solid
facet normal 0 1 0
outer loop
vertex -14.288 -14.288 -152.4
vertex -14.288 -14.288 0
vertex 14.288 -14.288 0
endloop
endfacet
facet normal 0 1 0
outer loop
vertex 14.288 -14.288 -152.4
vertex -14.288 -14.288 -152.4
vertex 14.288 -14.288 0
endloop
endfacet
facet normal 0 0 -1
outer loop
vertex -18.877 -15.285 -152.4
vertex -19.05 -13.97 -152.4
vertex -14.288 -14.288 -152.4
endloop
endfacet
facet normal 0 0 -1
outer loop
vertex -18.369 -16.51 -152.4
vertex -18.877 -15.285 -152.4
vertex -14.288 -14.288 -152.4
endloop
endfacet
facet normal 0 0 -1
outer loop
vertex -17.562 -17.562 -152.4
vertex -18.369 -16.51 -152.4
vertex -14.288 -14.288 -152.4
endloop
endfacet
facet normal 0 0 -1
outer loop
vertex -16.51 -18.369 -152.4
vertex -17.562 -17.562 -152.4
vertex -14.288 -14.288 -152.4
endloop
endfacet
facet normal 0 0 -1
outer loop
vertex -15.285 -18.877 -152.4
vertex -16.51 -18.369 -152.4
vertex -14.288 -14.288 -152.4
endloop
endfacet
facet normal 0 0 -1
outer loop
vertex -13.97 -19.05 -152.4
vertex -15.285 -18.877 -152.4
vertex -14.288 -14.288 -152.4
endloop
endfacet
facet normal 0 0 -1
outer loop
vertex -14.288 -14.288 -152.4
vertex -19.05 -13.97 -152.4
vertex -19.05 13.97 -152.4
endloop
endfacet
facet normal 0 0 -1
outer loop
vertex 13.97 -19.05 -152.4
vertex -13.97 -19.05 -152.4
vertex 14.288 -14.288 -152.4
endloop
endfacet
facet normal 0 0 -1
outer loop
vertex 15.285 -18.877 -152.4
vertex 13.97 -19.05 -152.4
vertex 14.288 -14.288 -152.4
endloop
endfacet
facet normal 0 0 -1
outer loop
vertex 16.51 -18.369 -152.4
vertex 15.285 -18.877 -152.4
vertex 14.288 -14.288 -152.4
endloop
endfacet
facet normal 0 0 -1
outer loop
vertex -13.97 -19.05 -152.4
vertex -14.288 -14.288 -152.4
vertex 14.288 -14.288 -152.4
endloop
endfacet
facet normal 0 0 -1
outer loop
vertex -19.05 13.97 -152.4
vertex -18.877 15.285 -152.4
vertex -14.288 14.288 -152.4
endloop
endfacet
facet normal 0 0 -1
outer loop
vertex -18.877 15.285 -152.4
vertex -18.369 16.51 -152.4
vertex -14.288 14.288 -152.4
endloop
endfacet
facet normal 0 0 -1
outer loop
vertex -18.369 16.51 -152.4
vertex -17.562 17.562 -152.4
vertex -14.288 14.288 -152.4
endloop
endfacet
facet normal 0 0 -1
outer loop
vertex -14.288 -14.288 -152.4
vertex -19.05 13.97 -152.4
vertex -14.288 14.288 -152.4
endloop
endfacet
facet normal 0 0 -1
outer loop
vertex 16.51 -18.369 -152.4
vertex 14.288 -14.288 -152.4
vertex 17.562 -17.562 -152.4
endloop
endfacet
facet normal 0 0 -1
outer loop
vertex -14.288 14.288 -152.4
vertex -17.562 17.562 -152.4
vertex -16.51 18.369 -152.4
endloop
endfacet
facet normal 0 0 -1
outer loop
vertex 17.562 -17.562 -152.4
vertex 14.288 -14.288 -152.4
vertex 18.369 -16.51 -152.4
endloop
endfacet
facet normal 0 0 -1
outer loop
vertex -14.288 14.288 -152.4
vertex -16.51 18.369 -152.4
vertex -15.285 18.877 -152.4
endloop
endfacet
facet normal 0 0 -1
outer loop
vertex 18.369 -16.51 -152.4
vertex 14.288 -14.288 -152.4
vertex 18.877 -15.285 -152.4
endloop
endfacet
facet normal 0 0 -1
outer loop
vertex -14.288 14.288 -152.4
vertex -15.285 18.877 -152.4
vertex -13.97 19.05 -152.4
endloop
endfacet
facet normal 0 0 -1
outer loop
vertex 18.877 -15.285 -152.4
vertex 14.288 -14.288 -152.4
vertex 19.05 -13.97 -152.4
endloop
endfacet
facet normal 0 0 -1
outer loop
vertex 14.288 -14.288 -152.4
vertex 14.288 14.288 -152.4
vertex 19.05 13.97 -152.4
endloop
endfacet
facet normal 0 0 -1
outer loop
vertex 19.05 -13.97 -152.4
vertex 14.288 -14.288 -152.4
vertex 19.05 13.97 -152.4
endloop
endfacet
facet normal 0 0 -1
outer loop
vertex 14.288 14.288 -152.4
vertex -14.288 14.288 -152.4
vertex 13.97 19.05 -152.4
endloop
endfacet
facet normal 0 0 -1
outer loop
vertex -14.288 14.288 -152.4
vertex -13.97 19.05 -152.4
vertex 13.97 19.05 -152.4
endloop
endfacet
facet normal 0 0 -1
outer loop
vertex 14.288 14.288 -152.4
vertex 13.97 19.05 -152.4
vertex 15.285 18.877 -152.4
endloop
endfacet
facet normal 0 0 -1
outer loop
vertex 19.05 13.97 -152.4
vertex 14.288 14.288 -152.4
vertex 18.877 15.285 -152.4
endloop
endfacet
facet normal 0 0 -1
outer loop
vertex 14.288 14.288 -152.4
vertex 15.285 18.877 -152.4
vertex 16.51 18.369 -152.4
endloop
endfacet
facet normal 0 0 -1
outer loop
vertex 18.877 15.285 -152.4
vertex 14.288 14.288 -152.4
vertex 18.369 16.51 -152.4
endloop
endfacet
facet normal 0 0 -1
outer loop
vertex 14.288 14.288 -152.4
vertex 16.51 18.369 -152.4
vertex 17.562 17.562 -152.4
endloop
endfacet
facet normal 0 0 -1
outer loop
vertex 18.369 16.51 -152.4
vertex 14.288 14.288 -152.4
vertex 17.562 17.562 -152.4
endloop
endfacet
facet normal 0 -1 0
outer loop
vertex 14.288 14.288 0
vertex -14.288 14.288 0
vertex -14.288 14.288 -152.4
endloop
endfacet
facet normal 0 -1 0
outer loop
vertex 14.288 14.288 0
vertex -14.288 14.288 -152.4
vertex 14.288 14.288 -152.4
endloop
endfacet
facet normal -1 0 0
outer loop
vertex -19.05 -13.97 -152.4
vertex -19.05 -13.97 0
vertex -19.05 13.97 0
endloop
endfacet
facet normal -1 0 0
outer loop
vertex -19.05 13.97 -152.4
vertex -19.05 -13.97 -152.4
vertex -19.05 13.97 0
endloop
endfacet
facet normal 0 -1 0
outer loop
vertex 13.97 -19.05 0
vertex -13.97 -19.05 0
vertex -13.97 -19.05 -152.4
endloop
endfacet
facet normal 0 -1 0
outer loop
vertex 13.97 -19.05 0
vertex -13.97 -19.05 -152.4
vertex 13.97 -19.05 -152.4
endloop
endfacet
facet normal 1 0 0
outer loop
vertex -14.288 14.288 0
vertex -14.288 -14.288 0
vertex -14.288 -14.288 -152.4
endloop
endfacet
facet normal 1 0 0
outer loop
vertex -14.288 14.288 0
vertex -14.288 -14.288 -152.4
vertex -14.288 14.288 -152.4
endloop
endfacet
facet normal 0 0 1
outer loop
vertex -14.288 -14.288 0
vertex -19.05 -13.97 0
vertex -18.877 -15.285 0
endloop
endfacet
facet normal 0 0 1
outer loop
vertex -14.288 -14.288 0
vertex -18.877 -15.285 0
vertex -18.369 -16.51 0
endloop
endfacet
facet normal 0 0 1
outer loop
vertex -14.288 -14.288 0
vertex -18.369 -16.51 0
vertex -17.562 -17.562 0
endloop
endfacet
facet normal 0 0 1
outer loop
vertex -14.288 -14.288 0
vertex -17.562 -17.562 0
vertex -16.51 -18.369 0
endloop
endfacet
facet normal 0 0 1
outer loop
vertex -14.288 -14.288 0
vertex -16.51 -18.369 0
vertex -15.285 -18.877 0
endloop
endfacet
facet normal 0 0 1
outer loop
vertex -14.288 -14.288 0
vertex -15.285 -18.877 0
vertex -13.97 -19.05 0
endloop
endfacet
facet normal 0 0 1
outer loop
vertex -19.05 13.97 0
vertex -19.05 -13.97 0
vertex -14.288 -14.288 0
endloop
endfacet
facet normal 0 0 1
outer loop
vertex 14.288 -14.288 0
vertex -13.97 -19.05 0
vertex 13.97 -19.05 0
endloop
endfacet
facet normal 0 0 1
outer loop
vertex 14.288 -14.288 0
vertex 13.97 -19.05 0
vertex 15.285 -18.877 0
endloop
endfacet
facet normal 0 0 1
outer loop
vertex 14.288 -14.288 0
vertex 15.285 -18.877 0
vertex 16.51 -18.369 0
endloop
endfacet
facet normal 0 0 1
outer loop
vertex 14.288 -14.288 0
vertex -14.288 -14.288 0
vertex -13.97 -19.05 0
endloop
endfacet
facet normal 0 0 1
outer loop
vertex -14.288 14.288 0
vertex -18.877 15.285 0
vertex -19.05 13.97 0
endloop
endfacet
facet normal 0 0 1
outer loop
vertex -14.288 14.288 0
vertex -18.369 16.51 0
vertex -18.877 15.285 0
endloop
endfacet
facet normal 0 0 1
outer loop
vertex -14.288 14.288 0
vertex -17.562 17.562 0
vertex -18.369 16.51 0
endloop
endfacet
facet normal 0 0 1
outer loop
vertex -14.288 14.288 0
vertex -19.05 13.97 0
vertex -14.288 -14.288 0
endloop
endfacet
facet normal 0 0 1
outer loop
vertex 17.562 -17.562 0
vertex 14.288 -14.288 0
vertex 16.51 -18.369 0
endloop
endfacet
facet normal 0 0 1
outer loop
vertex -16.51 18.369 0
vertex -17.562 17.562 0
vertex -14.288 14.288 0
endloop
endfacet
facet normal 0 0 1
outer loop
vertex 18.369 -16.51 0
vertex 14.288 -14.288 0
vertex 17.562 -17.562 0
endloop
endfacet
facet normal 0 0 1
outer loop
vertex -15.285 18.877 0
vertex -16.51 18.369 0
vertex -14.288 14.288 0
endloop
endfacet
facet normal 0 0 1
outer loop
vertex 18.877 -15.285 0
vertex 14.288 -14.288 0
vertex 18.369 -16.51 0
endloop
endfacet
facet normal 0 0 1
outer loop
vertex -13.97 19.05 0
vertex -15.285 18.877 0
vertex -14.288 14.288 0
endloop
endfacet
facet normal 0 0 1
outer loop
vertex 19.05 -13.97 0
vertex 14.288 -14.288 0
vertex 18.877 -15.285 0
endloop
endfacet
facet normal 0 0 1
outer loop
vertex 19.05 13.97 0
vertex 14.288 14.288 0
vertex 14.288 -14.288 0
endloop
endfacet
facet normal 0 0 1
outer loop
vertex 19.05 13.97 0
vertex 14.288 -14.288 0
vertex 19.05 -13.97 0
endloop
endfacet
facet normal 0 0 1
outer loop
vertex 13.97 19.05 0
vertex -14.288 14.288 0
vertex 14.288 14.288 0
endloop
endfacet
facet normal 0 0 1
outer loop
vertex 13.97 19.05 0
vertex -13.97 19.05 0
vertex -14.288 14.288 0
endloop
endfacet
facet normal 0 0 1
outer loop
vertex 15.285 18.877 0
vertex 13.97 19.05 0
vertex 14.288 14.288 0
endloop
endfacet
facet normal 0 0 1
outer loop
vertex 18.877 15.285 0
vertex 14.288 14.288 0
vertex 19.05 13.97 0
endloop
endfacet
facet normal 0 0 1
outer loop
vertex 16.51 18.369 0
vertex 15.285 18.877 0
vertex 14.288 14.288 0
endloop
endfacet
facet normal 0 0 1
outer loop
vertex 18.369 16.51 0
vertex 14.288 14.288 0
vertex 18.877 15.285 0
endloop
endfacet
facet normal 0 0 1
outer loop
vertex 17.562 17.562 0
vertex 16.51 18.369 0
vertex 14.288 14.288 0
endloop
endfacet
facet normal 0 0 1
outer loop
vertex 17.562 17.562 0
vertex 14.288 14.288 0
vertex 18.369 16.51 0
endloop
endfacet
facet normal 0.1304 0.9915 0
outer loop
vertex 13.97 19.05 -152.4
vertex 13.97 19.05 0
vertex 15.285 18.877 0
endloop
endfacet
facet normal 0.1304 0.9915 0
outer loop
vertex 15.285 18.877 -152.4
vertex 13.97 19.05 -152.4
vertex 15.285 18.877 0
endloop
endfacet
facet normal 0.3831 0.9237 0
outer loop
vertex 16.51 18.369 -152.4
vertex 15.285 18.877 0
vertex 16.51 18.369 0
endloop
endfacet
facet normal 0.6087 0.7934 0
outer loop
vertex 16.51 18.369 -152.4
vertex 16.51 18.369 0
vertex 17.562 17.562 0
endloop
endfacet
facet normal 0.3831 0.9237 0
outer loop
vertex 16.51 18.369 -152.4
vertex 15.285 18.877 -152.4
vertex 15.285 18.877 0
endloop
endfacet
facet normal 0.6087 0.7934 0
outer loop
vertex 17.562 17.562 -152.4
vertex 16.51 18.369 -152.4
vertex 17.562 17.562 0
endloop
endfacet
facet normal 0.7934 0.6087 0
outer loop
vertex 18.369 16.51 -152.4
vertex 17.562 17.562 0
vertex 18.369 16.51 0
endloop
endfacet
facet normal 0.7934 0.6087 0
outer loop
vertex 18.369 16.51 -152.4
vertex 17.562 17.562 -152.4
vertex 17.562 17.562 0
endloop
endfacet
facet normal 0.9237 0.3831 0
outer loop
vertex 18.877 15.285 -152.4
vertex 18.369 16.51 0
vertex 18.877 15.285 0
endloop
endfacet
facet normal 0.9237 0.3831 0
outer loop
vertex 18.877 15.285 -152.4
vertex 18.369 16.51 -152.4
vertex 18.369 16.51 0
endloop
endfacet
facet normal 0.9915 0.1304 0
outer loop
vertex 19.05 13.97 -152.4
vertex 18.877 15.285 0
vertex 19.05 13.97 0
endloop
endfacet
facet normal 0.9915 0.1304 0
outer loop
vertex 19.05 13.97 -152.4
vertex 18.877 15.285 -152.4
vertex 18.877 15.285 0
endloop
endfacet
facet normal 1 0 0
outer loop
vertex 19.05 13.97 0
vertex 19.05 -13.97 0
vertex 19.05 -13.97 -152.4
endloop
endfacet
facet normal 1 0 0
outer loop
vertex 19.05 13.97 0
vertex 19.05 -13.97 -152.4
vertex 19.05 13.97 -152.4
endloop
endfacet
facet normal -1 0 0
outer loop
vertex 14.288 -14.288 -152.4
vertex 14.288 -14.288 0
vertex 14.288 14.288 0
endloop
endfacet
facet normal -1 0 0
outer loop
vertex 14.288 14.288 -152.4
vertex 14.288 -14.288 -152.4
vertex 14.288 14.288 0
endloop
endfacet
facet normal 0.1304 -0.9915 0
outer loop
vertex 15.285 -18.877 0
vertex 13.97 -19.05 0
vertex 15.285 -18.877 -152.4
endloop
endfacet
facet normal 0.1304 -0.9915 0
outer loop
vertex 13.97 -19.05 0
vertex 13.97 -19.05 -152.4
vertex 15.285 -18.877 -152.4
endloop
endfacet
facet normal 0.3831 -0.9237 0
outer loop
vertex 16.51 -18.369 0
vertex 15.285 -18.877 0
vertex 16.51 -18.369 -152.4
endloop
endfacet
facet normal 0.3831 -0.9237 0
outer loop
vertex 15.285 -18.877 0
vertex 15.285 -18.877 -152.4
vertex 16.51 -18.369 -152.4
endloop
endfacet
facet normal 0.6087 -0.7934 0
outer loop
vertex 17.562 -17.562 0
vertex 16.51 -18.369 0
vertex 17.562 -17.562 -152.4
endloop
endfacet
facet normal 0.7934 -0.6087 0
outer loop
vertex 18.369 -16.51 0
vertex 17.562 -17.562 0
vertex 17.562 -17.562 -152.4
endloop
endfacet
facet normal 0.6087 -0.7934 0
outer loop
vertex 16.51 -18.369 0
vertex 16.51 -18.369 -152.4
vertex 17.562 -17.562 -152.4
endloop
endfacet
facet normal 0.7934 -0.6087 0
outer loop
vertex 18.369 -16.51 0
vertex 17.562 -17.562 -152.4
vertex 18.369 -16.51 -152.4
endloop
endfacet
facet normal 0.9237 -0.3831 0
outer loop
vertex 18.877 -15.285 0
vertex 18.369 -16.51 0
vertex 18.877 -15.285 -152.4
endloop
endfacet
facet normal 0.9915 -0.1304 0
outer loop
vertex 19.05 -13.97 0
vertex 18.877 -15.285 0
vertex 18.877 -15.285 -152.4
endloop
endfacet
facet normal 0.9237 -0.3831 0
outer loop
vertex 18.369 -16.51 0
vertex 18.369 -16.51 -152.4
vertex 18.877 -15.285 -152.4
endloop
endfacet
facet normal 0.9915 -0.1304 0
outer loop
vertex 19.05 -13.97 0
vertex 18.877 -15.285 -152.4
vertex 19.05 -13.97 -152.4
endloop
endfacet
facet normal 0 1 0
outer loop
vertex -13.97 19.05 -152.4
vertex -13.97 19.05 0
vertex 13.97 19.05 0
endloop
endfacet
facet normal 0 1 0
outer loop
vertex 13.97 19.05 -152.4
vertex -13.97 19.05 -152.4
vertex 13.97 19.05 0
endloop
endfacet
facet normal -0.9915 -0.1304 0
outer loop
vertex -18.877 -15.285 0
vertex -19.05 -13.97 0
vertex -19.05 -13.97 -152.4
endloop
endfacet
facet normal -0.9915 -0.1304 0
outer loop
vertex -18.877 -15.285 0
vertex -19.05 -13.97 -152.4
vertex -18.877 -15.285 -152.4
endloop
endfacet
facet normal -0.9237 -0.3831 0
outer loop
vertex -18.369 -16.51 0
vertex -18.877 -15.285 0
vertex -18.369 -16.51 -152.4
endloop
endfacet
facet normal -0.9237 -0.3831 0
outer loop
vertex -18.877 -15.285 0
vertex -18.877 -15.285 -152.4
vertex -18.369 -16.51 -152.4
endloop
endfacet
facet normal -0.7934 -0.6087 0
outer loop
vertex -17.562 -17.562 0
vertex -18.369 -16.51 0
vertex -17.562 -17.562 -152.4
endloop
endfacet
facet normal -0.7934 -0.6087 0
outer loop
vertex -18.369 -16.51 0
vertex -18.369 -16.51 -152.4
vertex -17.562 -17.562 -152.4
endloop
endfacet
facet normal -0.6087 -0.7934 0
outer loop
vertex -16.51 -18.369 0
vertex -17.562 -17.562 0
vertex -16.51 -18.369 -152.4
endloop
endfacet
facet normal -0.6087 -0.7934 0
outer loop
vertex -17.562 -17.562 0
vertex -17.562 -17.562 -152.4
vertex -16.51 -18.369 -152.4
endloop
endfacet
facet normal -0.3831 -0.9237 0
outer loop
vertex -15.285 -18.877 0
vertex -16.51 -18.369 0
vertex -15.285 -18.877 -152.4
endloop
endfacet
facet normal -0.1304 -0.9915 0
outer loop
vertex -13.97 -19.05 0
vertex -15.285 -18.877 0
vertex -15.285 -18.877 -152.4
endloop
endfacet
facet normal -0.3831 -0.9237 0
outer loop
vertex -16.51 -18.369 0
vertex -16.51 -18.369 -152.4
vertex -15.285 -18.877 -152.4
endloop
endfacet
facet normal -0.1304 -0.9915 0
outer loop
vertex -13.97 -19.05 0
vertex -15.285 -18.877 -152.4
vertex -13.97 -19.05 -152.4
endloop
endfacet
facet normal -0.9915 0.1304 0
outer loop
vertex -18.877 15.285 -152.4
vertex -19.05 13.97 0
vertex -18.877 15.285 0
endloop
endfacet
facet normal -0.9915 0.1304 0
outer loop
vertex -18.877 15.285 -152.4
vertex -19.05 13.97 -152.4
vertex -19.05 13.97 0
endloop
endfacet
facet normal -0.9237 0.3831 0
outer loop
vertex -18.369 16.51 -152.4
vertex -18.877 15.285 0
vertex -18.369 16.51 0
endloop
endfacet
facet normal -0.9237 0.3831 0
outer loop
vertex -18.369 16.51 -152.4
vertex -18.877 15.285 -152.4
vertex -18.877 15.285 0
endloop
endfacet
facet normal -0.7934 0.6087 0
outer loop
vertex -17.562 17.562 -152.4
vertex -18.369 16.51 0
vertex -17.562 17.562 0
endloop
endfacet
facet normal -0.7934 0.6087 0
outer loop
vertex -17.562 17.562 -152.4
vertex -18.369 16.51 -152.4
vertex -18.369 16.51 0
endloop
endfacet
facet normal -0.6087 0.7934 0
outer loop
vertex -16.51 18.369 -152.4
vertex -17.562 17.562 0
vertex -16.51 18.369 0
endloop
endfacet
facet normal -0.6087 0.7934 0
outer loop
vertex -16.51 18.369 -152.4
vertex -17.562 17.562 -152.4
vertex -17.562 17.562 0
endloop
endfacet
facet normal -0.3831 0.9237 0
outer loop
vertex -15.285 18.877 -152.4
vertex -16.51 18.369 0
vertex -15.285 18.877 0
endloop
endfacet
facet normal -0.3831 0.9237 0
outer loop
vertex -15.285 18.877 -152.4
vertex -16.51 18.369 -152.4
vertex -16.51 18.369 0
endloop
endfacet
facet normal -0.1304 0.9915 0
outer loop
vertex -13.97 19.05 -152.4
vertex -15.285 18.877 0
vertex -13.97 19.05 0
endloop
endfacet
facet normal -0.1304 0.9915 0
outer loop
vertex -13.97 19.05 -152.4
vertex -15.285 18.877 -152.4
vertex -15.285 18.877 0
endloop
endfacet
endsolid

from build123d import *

# Parameters (mm, degrees)
F0_W     = 38.1
F0_H     = 38.1
F0_W_2   = 28.575
F0_H_2   = 28.575
F1_DEPTH = 152.4
F2_R     = 5.08


with BuildPart() as f1:
    # F0 (on Top) → F1 (new body)
    with BuildSketch(Plane.XY):
        Rectangle(F0_W, F0_H)
        Rectangle(F0_W_2, F0_H_2, mode=Mode.SUBTRACT)
    extrude(amount=-F1_DEPTH)

    # F2
    f2_edges = [f1.edges().sort_by_distance(p)[0] for p in [
        (19.05, -19.05, -76.2),
        (19.05, 19.05, -76.2),
        (-19.05, -19.05, -76.2),
        (-19.05, 19.05, -76.2),
    ]]
    fillet(f2_edges, radius=F2_R)


solid = f1.part
